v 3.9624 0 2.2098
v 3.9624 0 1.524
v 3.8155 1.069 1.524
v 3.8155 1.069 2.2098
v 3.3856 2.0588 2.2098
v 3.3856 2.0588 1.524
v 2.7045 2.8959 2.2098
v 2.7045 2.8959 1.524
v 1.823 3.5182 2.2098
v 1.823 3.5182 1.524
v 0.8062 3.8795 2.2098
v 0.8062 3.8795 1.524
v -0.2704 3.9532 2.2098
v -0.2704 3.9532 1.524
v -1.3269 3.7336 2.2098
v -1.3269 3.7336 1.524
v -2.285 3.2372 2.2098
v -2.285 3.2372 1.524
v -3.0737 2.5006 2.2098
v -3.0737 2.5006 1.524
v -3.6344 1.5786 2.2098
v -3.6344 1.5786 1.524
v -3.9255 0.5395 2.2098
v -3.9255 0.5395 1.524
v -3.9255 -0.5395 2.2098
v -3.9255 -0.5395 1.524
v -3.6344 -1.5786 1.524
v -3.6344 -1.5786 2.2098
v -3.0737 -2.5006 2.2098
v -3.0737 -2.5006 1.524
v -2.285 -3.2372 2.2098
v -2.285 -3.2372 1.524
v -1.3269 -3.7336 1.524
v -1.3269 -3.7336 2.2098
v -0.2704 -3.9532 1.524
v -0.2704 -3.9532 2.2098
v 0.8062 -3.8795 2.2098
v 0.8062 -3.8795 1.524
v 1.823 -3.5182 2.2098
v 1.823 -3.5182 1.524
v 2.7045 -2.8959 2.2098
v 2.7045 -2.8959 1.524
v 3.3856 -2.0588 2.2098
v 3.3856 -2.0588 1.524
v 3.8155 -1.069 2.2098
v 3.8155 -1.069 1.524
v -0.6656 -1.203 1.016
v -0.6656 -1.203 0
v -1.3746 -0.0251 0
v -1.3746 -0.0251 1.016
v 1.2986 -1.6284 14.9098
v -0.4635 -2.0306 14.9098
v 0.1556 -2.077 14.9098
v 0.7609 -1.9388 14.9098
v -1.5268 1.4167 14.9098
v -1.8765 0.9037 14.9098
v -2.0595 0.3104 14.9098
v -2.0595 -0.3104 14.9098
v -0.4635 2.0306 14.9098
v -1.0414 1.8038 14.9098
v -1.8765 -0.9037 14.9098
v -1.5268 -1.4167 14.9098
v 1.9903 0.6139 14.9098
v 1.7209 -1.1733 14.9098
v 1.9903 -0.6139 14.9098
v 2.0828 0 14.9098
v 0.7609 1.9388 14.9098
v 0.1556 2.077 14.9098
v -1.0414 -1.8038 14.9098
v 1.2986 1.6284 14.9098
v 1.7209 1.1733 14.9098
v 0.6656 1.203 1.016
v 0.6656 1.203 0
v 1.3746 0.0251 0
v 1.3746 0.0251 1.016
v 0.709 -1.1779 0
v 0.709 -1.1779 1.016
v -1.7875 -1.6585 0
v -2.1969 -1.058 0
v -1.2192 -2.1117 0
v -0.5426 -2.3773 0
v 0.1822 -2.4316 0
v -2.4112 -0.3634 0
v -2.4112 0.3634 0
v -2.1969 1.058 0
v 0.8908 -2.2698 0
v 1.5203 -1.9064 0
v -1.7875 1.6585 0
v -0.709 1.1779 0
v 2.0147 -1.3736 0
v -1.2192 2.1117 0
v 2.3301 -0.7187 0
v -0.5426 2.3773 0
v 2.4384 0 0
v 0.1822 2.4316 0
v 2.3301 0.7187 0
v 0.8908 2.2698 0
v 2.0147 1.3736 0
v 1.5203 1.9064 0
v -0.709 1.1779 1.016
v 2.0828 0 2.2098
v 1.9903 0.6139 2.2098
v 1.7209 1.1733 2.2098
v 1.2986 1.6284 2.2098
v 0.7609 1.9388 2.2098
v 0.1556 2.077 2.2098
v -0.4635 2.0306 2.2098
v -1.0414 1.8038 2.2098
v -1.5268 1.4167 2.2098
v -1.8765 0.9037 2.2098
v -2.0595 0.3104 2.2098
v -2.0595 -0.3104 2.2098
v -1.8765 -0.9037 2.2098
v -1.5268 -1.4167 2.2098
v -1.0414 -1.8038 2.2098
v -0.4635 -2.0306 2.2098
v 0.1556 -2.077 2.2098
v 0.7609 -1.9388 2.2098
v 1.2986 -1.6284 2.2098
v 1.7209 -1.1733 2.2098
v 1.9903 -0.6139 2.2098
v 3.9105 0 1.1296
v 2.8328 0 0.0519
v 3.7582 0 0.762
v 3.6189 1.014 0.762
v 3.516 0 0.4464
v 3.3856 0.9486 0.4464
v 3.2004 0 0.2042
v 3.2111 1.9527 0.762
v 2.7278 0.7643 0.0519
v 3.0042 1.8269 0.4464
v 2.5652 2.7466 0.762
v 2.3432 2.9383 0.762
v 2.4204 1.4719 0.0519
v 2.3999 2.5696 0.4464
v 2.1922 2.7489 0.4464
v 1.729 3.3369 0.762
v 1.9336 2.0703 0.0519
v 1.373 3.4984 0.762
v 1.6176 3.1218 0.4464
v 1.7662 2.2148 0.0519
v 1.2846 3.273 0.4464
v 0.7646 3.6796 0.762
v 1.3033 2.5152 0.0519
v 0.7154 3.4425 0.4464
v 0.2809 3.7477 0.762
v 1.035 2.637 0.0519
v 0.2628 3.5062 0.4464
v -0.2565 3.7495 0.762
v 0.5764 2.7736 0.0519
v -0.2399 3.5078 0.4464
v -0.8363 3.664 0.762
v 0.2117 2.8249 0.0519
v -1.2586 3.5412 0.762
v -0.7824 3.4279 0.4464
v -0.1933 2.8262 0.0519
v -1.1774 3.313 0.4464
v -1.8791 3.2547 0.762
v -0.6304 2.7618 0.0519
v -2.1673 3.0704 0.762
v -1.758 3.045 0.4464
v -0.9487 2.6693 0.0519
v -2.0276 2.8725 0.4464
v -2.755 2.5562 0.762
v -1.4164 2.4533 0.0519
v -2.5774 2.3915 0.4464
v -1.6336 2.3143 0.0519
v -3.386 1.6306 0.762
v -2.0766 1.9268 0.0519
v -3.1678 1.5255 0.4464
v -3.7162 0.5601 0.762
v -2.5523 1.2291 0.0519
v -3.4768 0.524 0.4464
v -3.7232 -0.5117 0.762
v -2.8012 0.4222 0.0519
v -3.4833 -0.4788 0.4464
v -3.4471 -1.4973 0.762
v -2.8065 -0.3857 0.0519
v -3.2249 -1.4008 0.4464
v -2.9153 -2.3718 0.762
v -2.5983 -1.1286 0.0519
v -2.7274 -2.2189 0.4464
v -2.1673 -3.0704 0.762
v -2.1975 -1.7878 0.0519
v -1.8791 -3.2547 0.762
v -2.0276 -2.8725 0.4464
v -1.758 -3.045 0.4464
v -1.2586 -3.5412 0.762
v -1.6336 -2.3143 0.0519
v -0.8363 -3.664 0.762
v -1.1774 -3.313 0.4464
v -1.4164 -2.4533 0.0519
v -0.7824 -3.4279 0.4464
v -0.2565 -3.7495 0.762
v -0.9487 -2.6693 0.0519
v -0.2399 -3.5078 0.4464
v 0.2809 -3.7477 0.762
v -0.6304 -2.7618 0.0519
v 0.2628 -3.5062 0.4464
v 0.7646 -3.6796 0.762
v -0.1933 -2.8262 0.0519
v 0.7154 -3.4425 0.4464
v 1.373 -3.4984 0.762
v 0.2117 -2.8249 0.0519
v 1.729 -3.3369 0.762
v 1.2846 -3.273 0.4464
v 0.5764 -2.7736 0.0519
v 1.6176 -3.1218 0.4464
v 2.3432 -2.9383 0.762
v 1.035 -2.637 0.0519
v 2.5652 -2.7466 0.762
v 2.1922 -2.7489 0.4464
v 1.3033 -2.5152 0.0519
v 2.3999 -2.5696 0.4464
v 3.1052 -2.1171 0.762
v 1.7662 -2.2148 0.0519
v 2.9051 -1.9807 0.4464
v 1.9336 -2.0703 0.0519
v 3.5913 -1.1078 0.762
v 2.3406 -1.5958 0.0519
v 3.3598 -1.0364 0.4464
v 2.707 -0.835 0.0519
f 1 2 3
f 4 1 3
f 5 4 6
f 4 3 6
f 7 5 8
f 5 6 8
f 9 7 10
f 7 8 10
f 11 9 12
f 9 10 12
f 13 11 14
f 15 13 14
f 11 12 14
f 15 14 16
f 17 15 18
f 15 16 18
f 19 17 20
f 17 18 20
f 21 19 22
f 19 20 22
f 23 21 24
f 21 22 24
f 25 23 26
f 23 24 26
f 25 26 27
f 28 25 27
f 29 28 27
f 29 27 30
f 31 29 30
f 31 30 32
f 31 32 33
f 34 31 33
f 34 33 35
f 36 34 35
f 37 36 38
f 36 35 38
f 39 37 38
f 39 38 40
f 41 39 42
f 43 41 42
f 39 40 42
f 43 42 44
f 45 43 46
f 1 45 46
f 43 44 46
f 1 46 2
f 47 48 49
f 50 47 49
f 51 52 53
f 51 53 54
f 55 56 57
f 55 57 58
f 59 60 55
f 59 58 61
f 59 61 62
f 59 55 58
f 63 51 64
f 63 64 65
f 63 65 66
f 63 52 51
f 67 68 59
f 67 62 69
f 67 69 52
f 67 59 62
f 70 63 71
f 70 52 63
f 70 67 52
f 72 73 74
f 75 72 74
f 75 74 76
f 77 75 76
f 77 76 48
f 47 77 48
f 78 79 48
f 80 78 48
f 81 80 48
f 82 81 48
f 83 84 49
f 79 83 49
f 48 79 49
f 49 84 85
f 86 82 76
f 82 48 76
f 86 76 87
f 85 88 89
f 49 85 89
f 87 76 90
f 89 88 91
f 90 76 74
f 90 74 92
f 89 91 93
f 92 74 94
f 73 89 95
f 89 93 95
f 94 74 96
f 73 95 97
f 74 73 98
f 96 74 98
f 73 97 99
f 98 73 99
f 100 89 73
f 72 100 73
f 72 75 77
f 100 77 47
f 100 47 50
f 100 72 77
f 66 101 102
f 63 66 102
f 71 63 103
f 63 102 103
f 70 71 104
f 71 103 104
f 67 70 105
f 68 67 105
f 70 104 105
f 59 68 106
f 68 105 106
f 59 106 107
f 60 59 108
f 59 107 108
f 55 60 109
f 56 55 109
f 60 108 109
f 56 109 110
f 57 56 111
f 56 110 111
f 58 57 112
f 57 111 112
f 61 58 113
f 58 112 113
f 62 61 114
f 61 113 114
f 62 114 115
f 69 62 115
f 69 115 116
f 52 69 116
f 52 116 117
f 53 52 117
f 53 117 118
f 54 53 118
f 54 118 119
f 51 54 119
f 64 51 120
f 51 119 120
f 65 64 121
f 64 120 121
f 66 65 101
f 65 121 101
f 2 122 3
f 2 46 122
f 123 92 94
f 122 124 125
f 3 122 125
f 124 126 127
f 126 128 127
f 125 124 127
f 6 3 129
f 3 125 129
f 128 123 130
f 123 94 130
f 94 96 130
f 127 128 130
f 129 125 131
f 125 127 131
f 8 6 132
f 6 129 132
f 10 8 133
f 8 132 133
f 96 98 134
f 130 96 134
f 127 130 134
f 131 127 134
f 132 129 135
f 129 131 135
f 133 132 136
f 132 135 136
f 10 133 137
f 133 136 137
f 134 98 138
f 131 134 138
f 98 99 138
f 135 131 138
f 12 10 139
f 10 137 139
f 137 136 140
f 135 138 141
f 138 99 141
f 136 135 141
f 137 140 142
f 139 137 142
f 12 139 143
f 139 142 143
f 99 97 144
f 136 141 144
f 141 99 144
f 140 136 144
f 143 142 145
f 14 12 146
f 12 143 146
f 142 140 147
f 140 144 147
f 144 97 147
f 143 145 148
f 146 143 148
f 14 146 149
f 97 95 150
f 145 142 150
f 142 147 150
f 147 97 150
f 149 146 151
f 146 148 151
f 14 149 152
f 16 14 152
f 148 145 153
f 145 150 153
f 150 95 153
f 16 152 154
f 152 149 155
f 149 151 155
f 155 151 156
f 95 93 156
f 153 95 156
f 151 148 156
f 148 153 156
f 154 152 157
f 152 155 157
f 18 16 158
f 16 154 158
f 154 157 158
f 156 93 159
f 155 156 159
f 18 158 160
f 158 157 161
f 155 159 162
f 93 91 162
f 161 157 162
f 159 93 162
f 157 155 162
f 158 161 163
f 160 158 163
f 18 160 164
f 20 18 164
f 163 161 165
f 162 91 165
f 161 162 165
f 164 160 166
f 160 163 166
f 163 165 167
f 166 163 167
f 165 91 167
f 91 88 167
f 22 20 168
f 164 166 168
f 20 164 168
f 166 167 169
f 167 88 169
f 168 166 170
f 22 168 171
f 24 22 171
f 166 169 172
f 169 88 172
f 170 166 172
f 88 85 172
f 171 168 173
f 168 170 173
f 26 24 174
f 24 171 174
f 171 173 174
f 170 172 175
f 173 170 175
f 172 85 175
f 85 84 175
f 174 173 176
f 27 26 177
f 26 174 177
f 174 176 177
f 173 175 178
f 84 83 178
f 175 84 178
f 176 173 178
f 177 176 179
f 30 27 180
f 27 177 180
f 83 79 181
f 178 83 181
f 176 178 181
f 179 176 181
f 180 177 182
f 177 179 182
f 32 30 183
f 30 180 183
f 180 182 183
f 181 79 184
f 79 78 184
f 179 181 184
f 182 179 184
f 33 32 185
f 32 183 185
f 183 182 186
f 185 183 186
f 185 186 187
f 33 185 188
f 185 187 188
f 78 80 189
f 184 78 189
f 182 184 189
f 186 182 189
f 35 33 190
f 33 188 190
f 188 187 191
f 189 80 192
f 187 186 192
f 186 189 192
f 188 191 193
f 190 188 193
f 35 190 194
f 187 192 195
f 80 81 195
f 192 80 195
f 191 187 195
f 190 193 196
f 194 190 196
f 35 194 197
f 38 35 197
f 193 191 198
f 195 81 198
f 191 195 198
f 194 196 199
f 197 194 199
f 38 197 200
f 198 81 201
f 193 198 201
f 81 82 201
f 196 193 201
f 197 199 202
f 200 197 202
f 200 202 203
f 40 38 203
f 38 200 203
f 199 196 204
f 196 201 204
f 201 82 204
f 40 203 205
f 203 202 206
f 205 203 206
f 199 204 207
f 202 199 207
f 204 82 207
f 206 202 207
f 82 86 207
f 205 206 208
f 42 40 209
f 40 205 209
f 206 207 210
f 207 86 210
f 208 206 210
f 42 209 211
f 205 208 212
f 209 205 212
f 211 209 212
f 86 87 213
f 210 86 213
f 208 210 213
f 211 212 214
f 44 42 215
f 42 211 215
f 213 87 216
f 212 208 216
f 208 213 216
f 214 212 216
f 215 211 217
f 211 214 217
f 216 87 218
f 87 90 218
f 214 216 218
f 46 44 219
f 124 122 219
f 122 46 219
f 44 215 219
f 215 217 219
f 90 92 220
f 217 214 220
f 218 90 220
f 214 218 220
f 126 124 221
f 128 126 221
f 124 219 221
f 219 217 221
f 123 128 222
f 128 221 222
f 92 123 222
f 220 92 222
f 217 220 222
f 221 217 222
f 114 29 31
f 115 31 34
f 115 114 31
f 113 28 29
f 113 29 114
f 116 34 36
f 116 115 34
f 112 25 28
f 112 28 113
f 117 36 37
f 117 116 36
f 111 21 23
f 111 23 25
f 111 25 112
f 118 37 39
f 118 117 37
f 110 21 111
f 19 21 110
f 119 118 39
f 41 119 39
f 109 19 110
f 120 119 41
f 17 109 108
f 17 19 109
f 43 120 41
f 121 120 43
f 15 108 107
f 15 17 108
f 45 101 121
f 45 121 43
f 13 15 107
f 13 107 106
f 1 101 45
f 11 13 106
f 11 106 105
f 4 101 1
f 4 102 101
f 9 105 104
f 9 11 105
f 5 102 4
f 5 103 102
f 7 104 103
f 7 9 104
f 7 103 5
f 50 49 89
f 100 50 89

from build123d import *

# Parameters (mm, degrees)
SKETCH1_R      = 3.9624
EXTRUDE1_DEPTH = 2.2098
FILLET1_R      = 1.524
SKETCH2_R      = 2.0828
EXTRUDE2_DEPTH = 12.7
EXTRUDE3_DEPTH = 1.016


with BuildPart() as part:
    # Sketch1 → Extrude1 (new body)
    with BuildSketch(Plane.XY):
        Circle(SKETCH1_R)
    extrude(amount=EXTRUDE1_DEPTH)

    # Fillet1
    fillet1_edges = [part.edges().sort_by_distance(p)[0] for p in [
        (-3.9624, 0, 0),
    ]]
    fillet(fillet1_edges, radius=FILLET1_R)

    # Sketch2 → Extrude2 (add)
    with BuildSketch(Plane.XY.offset(2.2098)):
        Circle(SKETCH2_R)
    extrude(amount=EXTRUDE2_DEPTH)

    # Sketch3 → Extrude3 (cut)
    with BuildSketch(Plane(origin=(0, 0, 0), x_dir=(-1, 0, 0), z_dir=(0, 0, -1))):
        Polygon((0.709024608, 1.177879999), (-0.665561698, 1.202973322), (-1.374586306, 0.025093323), (-0.709024608, -1.177879999), (0.665561698, -1.202973322), (1.374586306, -0.025093323), align=None)
    extrude(amount=-EXTRUDE3_DEPTH, mode=Mode.SUBTRACT)


solid = part.part
